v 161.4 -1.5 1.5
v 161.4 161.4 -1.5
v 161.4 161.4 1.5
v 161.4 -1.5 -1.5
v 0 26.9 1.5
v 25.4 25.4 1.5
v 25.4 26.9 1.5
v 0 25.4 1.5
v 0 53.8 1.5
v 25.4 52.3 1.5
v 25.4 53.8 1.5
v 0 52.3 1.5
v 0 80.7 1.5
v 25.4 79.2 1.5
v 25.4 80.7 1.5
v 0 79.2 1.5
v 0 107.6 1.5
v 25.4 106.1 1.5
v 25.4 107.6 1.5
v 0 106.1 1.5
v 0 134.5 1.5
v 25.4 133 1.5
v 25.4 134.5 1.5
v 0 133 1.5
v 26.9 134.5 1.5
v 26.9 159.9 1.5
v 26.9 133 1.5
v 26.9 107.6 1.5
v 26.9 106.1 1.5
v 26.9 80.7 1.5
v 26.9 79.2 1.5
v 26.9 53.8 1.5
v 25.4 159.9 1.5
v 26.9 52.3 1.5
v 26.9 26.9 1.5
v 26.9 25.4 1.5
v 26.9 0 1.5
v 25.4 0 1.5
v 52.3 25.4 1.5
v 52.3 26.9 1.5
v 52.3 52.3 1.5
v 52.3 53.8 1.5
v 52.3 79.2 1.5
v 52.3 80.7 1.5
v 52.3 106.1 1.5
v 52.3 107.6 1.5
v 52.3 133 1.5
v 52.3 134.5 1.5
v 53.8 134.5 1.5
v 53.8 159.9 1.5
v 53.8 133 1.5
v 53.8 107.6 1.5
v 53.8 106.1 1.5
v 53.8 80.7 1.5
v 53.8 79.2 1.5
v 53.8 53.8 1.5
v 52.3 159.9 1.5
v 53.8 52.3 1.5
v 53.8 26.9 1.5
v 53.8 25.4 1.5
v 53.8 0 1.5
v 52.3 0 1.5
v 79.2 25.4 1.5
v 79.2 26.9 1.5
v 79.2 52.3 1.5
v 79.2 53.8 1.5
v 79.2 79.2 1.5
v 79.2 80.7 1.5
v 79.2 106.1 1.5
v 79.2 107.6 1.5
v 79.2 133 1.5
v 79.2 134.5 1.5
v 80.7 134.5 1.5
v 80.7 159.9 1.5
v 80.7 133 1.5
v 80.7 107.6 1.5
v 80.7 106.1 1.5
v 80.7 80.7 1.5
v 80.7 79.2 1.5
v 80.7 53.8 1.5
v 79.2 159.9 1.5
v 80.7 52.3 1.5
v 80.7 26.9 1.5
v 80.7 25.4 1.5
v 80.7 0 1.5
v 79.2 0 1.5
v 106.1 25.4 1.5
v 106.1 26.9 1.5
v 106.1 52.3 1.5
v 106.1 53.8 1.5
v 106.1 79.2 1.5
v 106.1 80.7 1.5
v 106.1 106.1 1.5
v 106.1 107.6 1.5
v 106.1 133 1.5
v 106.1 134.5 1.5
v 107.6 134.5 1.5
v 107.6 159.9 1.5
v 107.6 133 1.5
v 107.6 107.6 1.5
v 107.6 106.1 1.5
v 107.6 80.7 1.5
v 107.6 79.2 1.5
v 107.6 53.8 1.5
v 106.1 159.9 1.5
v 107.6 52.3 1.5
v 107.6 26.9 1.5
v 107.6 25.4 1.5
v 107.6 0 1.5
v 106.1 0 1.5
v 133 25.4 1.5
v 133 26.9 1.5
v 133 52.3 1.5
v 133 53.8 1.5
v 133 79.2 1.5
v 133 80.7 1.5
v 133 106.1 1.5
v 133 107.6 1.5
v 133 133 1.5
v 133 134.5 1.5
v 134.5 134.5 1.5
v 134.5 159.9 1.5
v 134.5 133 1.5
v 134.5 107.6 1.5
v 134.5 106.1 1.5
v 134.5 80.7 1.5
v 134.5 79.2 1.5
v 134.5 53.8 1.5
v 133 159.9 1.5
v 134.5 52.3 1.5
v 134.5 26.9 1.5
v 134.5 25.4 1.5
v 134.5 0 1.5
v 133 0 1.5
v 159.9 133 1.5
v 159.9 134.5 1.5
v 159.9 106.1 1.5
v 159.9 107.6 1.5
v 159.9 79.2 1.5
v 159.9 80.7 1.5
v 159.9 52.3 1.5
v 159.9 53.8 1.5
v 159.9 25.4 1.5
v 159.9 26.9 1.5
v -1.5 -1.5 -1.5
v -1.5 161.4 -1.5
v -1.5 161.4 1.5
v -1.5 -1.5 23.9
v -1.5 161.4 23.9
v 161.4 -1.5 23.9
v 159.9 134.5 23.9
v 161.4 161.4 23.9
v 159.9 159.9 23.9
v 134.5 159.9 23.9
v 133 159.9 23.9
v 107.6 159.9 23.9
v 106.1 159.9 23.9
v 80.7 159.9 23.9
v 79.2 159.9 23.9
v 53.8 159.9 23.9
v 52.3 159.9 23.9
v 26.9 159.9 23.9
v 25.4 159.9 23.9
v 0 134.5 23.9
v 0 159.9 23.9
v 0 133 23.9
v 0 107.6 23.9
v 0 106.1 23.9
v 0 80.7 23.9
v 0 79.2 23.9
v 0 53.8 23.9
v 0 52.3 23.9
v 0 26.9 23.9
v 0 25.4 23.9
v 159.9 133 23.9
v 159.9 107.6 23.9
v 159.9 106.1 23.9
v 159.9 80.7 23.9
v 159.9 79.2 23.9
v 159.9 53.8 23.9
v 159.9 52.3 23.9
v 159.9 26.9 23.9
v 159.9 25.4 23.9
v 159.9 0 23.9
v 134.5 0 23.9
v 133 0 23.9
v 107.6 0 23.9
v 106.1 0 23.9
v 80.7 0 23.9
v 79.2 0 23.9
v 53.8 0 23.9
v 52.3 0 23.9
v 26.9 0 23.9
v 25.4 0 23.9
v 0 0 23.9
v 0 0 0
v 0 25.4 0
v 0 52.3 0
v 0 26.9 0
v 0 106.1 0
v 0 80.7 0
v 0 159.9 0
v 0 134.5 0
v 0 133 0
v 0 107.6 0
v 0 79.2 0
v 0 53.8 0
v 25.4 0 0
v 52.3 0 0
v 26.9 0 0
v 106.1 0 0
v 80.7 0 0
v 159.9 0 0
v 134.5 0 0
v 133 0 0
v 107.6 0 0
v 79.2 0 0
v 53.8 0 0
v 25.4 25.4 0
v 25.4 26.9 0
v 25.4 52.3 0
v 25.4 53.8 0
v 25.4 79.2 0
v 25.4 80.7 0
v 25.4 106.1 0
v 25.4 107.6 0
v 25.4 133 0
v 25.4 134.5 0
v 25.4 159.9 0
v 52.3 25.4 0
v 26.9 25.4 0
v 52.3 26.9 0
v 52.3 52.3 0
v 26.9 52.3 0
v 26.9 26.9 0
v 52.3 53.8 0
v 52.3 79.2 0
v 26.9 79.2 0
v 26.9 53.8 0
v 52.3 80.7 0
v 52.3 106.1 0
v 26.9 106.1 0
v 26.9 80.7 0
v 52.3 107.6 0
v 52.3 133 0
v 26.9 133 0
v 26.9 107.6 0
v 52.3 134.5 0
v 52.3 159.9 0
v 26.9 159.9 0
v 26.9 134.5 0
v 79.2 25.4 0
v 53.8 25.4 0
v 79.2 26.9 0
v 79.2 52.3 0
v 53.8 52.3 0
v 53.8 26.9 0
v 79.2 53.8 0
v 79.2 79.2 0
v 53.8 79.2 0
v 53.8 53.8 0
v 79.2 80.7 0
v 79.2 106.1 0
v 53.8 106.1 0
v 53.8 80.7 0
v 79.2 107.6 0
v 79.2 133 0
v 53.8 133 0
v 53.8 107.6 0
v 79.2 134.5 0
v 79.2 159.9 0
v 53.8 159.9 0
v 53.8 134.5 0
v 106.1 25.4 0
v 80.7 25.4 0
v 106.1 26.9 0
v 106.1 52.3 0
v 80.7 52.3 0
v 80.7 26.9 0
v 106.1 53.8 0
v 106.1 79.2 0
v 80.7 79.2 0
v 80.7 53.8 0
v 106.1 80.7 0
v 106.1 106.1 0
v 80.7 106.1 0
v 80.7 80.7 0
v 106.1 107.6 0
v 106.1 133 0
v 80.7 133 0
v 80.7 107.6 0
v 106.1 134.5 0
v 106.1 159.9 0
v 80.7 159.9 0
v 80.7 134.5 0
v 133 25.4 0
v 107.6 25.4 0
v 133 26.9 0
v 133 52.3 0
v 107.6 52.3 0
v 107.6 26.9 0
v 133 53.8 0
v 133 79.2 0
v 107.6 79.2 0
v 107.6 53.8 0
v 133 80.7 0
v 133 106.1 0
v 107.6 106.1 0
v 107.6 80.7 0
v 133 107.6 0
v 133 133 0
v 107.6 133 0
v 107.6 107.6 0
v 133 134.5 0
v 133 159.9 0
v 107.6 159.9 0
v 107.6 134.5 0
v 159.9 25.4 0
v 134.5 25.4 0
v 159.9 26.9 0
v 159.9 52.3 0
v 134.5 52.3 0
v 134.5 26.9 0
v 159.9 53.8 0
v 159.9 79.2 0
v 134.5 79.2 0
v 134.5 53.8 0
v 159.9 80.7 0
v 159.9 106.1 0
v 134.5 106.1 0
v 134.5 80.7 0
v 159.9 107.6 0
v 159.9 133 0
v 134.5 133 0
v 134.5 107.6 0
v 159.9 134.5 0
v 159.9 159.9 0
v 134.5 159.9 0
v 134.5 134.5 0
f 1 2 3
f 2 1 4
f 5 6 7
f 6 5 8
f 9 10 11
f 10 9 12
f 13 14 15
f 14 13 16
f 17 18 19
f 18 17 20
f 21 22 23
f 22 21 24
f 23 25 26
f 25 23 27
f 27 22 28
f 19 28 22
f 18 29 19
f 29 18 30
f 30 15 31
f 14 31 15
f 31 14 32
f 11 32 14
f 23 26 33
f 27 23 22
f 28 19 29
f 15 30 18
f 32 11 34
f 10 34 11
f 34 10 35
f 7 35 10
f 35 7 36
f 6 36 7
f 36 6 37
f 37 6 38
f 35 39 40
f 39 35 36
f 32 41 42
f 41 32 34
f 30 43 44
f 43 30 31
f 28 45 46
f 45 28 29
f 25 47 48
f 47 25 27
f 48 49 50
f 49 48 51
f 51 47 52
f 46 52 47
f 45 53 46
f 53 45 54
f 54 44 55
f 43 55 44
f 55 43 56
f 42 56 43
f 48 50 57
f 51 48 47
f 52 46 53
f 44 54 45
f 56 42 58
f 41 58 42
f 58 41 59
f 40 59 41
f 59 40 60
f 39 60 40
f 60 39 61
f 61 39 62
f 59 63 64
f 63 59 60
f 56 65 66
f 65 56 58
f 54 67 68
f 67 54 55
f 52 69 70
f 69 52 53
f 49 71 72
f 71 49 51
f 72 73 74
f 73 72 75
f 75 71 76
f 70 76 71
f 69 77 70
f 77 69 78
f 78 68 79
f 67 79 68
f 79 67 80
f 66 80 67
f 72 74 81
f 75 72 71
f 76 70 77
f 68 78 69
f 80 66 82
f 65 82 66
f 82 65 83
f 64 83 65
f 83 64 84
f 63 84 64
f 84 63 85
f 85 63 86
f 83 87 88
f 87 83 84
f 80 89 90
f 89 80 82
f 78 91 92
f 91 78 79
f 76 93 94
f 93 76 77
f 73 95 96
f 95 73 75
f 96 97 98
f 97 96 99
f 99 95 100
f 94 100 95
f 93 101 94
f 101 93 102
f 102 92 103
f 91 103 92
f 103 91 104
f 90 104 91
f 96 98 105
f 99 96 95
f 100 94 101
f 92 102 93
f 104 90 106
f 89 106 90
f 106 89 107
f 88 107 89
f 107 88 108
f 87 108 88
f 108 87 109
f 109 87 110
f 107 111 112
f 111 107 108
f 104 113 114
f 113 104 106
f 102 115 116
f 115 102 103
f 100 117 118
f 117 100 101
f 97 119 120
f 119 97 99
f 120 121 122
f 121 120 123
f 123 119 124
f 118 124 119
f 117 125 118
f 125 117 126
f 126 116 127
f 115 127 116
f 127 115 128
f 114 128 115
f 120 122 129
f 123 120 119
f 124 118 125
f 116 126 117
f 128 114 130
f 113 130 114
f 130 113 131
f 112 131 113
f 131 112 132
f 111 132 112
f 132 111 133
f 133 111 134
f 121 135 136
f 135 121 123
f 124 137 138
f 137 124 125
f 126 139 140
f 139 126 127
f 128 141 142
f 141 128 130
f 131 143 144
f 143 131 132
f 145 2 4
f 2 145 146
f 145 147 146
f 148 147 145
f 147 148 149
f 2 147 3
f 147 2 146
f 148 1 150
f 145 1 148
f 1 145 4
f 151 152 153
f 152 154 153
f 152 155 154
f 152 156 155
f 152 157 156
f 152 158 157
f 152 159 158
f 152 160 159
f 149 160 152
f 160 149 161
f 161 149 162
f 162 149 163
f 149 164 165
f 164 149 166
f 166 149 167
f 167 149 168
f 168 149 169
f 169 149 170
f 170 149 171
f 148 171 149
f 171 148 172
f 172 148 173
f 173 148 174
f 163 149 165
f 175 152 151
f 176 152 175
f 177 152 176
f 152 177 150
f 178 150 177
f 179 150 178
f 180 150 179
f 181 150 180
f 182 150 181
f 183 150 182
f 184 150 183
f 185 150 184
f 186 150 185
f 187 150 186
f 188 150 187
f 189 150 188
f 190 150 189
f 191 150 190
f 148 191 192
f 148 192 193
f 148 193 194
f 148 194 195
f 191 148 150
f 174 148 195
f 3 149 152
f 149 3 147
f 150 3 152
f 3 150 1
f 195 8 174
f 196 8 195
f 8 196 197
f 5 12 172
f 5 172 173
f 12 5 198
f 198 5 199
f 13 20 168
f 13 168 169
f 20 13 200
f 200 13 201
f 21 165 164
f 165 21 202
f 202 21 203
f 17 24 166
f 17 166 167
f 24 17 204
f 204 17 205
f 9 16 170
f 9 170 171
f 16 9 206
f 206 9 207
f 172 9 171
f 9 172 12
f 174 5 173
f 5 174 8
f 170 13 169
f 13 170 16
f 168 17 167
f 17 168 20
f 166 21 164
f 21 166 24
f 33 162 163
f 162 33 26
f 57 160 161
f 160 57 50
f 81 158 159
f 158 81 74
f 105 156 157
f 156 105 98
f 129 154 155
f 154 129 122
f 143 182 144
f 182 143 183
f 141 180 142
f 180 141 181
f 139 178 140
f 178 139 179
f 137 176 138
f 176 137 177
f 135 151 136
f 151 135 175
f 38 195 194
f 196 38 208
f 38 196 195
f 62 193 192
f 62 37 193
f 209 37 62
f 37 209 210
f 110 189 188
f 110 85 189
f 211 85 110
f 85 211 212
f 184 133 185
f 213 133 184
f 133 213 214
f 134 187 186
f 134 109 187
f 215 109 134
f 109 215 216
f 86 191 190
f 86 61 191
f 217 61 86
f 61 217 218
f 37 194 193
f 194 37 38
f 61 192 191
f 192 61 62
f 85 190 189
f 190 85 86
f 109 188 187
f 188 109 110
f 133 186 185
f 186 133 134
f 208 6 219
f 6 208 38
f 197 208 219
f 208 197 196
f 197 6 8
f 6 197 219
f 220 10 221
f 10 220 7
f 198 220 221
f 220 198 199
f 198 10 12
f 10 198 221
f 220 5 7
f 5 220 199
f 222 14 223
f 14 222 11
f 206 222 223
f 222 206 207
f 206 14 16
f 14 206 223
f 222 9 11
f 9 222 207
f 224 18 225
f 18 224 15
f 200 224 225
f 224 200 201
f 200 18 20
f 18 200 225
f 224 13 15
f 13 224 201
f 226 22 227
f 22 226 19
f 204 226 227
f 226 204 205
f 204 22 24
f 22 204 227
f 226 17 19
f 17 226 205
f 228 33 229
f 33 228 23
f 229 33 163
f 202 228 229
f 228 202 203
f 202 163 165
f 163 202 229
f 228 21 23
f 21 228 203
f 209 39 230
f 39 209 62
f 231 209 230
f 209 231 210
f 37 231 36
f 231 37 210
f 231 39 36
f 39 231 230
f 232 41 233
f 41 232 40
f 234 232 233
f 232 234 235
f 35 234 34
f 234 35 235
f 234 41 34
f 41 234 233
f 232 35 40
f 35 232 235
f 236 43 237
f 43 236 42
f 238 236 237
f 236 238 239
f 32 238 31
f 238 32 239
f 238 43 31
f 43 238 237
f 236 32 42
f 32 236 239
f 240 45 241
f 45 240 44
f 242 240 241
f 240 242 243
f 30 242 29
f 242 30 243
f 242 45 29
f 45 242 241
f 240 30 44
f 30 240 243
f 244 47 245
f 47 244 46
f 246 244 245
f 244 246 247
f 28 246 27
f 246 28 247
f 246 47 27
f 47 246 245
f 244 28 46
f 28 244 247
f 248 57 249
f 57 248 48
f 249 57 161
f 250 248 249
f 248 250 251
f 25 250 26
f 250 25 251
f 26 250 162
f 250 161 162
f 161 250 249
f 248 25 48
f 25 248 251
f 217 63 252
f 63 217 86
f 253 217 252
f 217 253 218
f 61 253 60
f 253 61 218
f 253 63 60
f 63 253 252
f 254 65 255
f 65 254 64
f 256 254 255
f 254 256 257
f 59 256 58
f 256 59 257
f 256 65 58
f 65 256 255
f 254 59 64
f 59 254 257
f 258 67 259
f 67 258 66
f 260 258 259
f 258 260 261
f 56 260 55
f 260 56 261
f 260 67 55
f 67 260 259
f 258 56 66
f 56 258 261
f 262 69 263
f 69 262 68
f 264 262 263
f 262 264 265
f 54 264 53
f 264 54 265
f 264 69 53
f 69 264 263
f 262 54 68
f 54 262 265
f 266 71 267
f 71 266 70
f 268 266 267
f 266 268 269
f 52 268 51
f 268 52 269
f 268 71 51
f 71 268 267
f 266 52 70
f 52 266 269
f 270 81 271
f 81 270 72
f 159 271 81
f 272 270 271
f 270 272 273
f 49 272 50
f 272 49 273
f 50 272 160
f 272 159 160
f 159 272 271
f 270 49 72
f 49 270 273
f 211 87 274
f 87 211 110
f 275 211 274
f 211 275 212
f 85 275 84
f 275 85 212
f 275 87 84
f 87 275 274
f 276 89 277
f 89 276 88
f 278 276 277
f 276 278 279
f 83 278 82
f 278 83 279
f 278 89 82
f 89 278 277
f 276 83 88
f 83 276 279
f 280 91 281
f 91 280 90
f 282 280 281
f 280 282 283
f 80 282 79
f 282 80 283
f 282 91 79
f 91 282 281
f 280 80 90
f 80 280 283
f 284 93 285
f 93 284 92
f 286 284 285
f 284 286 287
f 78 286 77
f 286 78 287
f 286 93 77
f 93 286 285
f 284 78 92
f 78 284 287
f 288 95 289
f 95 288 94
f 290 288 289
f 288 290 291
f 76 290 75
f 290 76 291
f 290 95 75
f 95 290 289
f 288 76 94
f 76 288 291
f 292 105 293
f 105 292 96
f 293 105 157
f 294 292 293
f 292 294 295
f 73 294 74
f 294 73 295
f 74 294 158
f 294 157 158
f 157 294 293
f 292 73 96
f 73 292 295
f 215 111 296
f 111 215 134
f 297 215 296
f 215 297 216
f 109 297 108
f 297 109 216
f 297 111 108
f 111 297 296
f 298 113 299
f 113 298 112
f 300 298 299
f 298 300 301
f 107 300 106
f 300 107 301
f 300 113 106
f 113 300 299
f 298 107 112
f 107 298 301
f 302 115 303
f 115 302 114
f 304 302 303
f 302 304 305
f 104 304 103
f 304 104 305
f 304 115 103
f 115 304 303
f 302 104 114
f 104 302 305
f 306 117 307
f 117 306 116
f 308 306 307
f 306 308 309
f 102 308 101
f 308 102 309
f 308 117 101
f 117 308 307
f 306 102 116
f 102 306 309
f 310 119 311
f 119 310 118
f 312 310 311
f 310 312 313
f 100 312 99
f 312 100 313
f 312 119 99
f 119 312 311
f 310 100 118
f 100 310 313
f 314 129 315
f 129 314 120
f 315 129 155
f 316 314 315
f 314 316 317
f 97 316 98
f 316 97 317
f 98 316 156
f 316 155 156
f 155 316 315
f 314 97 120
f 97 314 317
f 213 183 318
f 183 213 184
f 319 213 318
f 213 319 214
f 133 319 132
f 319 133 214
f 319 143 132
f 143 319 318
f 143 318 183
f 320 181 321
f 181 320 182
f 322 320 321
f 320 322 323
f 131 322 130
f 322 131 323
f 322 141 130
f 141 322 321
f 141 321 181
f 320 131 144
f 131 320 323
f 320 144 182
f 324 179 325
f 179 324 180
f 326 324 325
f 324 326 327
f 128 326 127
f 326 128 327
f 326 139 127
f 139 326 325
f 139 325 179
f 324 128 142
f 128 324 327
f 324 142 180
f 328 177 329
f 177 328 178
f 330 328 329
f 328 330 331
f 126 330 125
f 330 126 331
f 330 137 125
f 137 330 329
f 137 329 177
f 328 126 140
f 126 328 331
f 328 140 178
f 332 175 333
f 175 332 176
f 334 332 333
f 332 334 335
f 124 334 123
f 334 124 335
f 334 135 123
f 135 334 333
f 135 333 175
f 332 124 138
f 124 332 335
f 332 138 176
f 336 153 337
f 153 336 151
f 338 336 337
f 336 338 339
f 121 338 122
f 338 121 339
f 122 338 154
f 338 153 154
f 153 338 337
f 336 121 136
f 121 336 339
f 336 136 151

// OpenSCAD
inch = 25.4;

small_cube = [
    1 * inch,
    1 * inch,
    1 * inch,
];

space = 1.5;

rows = 6;
cols = 6;

plate_x = ((inch + space) * rows) + space;
plate_y = ((inch + space) * cols) + space;


difference() {
    union() {
        translate([-space, -space, -space]) {
            cube([
                ((inch + space) * rows) + space,
                ((inch + space) * cols) + space,
                space * 2,
            ]);
        }
        
        translate([-space, -space, -space]) {
            linear_extrude(height = inch) {
                difference() {
                    square([plate_x, plate_y]);
                    offset(-space)
                        square([plate_x, plate_y]);
                }
            }
        }
    }
    for (i = [0 : (rows - 1)]) {
        for (j = [0 : (cols - 1)]) {
            x_offset = (small_cube[0] + space) * i;
            y_offset = (small_cube[1] + space) * j;
            translate([x_offset, y_offset, 0]) {
                cube(small_cube);
            }
        }
    }
}
